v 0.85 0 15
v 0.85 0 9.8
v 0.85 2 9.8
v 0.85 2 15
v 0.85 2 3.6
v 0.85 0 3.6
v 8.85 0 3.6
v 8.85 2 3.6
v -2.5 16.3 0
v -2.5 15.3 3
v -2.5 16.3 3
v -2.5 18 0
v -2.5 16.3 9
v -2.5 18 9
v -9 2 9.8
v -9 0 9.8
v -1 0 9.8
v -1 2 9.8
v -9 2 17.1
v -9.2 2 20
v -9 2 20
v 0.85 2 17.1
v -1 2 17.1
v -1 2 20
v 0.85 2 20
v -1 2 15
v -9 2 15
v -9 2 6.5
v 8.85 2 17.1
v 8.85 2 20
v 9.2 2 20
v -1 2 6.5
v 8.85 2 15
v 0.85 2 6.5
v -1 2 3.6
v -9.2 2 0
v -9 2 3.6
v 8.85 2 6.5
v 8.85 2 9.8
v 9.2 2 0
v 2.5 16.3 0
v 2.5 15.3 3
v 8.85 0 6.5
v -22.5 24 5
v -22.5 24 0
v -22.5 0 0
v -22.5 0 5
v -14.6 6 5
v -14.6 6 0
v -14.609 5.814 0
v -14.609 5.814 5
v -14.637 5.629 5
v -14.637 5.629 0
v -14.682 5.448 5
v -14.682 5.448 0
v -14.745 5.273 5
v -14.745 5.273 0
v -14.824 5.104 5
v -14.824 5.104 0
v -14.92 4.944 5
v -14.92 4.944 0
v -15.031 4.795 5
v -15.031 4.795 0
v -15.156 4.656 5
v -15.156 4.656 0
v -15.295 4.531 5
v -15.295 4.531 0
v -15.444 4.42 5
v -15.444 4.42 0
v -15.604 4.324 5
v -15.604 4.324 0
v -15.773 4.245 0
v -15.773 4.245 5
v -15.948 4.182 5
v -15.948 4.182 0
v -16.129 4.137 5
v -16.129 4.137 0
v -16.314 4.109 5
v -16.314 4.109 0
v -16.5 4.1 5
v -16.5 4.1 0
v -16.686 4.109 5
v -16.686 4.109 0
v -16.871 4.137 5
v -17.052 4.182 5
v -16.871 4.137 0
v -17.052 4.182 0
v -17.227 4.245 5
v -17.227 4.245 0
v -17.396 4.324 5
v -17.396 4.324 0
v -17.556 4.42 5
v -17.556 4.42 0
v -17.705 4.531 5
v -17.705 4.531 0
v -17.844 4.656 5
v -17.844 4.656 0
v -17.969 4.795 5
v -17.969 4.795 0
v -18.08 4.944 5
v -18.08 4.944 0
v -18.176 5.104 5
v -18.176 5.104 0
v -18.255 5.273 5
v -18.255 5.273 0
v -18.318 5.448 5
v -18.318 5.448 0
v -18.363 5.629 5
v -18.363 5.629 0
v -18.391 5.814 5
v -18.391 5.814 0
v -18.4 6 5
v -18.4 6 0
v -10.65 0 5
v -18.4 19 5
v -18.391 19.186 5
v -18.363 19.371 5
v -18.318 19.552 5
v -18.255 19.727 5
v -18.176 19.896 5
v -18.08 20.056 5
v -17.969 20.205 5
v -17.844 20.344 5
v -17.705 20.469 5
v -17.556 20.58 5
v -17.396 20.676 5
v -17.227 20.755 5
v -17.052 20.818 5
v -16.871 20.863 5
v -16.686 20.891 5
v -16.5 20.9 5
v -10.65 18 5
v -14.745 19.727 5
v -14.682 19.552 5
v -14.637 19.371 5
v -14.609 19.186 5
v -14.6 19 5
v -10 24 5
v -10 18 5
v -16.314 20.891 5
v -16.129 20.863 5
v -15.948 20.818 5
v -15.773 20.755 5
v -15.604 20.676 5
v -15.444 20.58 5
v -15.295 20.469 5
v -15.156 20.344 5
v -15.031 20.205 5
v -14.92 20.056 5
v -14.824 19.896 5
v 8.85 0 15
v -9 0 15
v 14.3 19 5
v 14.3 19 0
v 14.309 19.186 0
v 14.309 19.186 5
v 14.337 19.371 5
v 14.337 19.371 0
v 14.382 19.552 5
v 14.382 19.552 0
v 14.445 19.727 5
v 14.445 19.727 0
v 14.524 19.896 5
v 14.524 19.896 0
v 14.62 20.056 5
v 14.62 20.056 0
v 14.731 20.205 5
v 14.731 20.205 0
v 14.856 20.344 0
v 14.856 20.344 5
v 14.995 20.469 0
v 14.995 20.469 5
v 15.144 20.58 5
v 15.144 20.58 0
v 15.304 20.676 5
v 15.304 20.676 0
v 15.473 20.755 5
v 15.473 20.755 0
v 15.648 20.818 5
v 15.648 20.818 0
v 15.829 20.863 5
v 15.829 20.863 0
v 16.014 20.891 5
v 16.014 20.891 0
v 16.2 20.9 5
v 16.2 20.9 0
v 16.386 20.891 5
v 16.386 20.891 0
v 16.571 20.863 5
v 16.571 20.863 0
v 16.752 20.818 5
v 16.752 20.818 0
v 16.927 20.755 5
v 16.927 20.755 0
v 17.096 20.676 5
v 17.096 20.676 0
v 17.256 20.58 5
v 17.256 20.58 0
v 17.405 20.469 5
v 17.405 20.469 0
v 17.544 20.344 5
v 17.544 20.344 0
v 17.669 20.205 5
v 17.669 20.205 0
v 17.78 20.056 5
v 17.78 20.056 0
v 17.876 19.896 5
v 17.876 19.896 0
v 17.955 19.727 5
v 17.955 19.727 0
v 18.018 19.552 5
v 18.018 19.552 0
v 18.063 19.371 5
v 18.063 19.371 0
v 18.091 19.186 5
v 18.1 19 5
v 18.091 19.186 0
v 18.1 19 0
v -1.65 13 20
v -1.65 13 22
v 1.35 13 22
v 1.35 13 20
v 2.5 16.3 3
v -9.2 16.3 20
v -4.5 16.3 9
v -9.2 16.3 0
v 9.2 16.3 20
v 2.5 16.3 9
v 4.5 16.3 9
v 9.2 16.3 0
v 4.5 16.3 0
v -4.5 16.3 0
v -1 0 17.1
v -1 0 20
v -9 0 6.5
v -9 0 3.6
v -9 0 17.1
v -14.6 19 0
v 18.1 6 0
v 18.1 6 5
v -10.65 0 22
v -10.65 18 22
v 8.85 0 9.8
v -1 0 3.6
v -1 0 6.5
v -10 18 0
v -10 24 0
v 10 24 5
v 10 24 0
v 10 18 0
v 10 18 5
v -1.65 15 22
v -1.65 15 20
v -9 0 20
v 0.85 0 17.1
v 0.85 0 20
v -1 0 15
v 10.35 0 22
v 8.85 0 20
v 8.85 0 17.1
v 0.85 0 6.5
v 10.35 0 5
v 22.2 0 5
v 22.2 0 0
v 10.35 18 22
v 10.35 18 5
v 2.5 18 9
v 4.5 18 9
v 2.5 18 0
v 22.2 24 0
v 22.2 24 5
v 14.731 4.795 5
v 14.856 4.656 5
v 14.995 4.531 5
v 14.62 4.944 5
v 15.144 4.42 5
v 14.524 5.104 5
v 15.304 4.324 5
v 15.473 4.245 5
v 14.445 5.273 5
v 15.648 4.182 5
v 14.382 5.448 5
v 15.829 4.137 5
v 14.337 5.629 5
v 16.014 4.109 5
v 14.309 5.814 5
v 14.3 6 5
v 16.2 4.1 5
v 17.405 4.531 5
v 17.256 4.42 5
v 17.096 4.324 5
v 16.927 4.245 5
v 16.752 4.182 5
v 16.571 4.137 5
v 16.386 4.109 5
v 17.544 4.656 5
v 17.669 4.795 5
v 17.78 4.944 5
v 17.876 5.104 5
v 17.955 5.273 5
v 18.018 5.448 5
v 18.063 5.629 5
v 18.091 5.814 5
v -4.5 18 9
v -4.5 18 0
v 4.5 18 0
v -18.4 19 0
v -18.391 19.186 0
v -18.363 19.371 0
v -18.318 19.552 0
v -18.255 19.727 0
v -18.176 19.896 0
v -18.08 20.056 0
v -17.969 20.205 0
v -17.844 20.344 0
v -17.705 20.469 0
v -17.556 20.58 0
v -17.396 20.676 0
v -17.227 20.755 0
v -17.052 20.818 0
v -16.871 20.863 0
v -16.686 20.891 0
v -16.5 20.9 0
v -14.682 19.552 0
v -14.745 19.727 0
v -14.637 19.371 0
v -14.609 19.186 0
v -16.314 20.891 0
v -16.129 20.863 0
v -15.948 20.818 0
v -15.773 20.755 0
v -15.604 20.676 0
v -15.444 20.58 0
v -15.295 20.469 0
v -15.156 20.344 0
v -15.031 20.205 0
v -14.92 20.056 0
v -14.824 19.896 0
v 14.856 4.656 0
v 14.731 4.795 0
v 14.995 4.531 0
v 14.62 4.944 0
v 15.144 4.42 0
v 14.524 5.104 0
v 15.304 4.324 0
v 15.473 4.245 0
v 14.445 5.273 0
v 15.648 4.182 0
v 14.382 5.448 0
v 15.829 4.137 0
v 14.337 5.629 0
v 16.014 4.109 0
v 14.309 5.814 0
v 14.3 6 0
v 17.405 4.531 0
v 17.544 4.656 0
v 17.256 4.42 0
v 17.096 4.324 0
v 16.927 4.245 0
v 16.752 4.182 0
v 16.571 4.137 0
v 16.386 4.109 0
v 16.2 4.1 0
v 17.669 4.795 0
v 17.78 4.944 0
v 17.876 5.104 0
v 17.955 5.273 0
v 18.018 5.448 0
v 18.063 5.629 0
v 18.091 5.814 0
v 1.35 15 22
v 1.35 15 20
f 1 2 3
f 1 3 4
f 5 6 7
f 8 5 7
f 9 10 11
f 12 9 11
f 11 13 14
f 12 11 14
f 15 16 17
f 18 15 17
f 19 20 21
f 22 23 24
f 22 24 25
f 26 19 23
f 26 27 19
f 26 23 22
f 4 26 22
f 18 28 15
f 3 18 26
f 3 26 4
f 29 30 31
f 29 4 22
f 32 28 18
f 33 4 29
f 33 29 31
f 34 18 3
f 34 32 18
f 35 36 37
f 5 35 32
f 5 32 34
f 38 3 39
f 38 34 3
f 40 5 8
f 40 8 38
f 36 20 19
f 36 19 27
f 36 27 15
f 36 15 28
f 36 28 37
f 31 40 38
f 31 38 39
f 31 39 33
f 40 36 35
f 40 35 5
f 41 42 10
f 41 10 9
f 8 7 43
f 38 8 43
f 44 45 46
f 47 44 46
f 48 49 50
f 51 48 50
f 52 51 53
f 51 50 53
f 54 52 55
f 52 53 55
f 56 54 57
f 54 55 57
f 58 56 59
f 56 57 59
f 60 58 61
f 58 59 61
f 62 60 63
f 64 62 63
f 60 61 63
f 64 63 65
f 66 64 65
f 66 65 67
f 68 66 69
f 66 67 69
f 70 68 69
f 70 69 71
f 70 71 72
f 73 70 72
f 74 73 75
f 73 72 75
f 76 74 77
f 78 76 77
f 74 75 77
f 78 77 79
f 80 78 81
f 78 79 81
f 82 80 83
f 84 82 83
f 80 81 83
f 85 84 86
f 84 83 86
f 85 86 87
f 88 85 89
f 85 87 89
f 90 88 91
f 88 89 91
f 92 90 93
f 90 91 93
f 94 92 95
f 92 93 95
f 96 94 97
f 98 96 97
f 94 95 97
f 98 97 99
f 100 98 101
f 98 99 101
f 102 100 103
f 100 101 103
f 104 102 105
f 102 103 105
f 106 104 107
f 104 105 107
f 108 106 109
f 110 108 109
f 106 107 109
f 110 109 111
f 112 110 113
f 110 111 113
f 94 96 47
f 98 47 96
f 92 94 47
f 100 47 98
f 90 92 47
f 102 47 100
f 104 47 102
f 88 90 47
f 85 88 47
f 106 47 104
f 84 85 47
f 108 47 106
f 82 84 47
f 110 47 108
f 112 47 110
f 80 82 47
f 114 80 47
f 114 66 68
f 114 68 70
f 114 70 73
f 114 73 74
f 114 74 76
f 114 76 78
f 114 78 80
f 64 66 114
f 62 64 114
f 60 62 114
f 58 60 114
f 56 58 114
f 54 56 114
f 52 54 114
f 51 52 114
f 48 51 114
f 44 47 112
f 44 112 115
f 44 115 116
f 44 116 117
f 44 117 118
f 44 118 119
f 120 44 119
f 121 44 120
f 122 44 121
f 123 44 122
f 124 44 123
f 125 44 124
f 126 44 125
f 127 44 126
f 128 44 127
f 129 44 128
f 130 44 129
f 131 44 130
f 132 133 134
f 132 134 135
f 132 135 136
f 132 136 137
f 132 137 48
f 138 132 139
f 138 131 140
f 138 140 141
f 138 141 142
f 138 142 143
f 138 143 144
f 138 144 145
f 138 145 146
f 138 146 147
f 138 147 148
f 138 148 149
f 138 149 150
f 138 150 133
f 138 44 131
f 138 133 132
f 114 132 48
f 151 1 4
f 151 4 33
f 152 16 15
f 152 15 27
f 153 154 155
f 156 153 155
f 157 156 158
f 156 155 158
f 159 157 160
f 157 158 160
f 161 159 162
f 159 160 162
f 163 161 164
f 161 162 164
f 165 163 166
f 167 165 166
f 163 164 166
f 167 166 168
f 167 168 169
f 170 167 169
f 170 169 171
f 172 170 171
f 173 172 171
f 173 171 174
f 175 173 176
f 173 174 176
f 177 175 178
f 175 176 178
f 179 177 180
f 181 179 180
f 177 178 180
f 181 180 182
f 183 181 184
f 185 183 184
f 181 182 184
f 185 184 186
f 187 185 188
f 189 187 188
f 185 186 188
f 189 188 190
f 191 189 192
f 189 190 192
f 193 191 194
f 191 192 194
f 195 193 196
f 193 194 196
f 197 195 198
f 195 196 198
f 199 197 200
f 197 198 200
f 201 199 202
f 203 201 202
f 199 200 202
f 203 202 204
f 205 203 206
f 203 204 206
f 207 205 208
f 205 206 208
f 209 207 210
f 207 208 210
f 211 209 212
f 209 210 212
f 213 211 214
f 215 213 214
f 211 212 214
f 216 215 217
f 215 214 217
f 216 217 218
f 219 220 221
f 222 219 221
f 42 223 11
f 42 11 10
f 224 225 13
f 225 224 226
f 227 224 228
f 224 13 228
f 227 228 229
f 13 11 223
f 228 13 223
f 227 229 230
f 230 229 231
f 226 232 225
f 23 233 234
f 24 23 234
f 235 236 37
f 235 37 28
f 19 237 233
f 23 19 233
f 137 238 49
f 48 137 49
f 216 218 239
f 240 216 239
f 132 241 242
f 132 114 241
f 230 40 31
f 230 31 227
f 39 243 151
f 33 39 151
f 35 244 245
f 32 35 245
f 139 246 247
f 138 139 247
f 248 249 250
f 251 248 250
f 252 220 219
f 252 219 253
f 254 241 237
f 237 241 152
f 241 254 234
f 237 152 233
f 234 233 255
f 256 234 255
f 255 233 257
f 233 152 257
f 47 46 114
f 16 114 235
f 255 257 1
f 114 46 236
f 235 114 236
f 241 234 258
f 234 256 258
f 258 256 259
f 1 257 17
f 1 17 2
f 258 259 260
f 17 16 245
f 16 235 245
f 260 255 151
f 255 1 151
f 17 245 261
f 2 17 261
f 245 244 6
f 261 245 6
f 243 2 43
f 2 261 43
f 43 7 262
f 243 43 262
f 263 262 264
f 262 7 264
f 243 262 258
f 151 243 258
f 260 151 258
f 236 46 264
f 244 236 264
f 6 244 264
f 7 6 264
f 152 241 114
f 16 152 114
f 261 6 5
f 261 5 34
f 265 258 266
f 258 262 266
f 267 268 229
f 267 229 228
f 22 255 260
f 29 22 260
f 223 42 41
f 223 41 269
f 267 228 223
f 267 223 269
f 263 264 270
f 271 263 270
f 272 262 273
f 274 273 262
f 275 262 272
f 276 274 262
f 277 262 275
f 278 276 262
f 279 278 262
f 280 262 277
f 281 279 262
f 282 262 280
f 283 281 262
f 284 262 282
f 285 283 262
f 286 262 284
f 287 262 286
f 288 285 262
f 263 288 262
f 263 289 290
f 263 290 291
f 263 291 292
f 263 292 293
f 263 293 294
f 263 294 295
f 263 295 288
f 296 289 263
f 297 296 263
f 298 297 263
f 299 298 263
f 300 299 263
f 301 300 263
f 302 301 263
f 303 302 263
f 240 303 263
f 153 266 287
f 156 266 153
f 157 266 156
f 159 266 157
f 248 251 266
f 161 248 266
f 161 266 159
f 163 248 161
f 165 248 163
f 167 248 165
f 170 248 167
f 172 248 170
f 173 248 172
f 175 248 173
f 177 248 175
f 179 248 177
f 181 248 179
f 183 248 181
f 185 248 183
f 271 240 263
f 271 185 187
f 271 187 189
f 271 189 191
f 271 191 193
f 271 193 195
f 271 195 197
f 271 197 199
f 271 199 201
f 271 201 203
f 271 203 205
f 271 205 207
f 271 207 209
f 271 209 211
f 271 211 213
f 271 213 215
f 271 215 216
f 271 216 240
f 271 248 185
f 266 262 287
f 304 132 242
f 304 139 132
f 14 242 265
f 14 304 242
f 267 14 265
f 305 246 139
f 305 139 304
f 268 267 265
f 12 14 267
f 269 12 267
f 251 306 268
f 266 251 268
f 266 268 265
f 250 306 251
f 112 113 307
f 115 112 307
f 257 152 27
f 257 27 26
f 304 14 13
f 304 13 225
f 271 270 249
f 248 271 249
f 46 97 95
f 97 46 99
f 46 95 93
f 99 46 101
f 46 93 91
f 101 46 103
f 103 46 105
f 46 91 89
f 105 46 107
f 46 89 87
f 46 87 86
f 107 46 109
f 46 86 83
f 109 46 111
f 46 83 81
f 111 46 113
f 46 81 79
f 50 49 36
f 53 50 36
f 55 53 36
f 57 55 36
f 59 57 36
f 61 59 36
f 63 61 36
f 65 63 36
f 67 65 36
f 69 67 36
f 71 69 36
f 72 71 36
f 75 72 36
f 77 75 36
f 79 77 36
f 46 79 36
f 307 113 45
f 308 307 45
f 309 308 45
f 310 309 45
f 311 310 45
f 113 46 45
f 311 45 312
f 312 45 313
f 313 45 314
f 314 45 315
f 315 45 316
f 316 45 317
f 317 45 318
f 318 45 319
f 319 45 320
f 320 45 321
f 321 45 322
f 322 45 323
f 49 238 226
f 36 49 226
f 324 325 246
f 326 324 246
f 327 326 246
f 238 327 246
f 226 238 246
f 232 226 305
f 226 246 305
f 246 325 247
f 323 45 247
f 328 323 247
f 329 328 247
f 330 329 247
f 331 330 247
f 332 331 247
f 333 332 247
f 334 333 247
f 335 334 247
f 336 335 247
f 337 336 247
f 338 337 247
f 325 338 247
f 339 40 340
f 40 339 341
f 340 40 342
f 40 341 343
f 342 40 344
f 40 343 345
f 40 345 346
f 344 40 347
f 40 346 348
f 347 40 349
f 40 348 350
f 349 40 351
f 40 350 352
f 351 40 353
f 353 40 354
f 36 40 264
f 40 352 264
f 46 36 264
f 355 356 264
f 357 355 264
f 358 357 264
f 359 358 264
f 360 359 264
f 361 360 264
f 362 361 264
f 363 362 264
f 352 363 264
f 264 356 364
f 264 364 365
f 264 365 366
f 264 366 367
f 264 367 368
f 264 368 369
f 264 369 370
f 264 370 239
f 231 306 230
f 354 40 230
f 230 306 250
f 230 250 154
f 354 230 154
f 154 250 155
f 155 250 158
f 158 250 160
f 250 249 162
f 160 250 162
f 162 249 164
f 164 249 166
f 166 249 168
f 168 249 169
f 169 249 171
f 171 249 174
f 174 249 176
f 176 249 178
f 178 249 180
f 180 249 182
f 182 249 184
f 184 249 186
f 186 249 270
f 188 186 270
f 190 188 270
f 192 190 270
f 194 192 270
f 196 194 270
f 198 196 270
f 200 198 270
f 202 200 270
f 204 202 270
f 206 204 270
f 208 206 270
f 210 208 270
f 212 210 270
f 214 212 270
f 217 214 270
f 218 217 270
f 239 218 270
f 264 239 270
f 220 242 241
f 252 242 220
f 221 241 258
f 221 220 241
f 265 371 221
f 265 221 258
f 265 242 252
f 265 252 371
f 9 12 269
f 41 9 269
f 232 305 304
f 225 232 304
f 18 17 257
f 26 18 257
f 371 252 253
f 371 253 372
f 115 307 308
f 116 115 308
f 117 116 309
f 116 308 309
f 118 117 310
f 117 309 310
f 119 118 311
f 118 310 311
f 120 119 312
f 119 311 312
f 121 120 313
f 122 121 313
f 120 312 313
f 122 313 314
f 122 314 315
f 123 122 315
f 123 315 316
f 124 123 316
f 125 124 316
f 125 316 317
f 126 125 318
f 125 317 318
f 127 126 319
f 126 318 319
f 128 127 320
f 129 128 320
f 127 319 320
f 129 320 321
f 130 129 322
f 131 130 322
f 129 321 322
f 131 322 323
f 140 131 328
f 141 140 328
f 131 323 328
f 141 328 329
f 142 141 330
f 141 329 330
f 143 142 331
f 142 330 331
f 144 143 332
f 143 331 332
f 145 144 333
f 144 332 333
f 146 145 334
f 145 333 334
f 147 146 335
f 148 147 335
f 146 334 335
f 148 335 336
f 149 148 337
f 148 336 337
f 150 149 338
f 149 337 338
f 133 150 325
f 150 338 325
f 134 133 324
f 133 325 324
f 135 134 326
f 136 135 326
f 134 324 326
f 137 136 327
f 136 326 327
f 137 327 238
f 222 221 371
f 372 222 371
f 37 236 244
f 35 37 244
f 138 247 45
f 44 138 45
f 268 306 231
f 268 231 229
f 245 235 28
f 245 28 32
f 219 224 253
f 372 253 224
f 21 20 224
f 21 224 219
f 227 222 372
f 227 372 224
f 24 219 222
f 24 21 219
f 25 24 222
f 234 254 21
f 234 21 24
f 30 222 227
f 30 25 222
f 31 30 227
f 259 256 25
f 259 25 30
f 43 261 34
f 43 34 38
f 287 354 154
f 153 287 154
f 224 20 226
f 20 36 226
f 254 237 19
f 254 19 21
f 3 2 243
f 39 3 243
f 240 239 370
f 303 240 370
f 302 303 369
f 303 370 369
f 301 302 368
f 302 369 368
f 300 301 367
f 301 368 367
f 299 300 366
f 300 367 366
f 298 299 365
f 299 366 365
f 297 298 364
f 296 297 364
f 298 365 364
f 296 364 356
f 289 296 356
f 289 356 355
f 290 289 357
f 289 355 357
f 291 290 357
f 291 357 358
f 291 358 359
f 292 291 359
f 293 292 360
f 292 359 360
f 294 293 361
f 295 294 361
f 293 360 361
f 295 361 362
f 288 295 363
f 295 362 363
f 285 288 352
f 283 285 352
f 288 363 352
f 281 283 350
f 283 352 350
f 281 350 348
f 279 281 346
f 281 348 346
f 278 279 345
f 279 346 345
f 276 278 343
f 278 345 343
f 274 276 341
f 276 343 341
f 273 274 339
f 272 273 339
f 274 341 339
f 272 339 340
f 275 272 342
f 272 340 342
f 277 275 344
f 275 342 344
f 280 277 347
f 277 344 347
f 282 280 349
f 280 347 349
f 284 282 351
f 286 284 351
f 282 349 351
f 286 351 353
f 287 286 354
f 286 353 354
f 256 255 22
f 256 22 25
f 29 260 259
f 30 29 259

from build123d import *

# Parameters (mm, degrees)
F0_W      = 18.4
F0_H      = 14.3
F1_DEPTH  = 5
F2_W      = 18.4
F2_H      = 14.3
F3_DEPTH  = 15
F4_W      = 21
F4_H      = 18
F5_DEPTH  = 2
F6_W      = 8
F6_H      = 2.9
F6_H_2    = 5.2
F7_DEPTH  = 3
F8_W      = 2
F8_H      = 11.251825
F9_DEPTH  = 3
F11_DEPTH = 5
F12_W     = 3
F12_H     = 2
F13_DEPTH = 5


with BuildPart() as f1:
    # F0 (on Top) → F1 (new body)
    with BuildSketch(Plane.XY):
        Polygon((-10, 24), (-22.5, 24), (-22.5, 0), (22.2, 0), (22.2, 24), (10, 24), (10, 18), (-10, 18), align=None)
        with Locations((0, 9.15)):
            Rectangle(F0_W, F0_H, mode=Mode.SUBTRACT)
        with BuildLine():
            Line((-18.4, 6), (-18.4, 19))
            ThreePointArc((-18.4, 19), (-16.5, 20.9), (-14.6, 19))
            Line((-14.6, 19), (-14.6, 6))
            ThreePointArc((-14.6, 6), (-16.5, 4.1), (-18.4, 6))
        make_face(mode=Mode.SUBTRACT)
        with BuildLine():
            Line((14.3, 6), (14.3, 19))
            ThreePointArc((14.3, 19), (16.2, 20.9), (18.1, 19))
            Line((18.1, 19), (18.1, 6))
            ThreePointArc((18.1, 6), (16.2, 4.1), (14.3, 6))
        make_face(mode=Mode.SUBTRACT)
    extrude(amount=F1_DEPTH)

    # F2 (on face) → F3 (join)
    with BuildSketch(Plane.XY.offset(5)):
        Polygon((-10.65, 18), (-10.65, 0), (10.35, 0), (10.35, 18), (10, 18), (-10, 18), align=None)
        with Locations((0, 9.15)):
            Rectangle(F2_W, F2_H, mode=Mode.SUBTRACT)
    extrude(amount=F3_DEPTH)

    # F4 (on face) → F5 (join)
    with BuildSketch(Plane.XY.offset(20)):
        with Locations((-0.15, 9)):
            Rectangle(F4_W, F4_H)
    extrude(amount=F5_DEPTH)

    # F6 (on face) → F7 (cut)
    with BuildSketch(Plane.XZ):
        with Locations((-5, 18.55)):
            Rectangle(F6_W, F6_H)
        with Locations((4.85, 18.55)):
            Rectangle(F6_W, F6_H)
        with Locations((-5, 12.4)):
            Rectangle(F6_W, F6_H_2)
        with Locations((4.85, 12.4)):
            Rectangle(F6_W, F6_H_2)
        with Locations((-5, 5.05)):
            Rectangle(F6_W, F6_H)
        with Locations((4.85, 5.05)):
            Rectangle(F6_W, F6_H)
    extrude(amount=-F7_DEPTH, mode=Mode.SUBTRACT)

    # F8 (on face) → F9 (cut)
    with BuildSketch(Plane(origin=(0, 18, 0), x_dir=(-1, 0, 0), z_dir=(0, 1, 0))):
        with Locations((-3.5, 3.374087)):
            Rectangle(F8_W, F8_H)
        with Locations((3.5, 3.374087)):
            Rectangle(F8_W, F8_H)
    extrude(amount=-F9_DEPTH, mode=Mode.SUBTRACT)

    # F10 (on face) → F11 (join)
    with BuildSketch(Plane.YZ.offset(2.5)):
        Polygon((16.3, 0), (16.3, 3), (15.3, 3), align=None)
    extrude(amount=-F11_DEPTH)

    # F12 (on face) → F13 (cut)
    with BuildSketch(Plane.XY.offset(22)):
        with Locations((-0.15, 14)):
            Rectangle(F12_W, F12_H)
    extrude(amount=-F13_DEPTH, mode=Mode.SUBTRACT)


solid = f1.part
